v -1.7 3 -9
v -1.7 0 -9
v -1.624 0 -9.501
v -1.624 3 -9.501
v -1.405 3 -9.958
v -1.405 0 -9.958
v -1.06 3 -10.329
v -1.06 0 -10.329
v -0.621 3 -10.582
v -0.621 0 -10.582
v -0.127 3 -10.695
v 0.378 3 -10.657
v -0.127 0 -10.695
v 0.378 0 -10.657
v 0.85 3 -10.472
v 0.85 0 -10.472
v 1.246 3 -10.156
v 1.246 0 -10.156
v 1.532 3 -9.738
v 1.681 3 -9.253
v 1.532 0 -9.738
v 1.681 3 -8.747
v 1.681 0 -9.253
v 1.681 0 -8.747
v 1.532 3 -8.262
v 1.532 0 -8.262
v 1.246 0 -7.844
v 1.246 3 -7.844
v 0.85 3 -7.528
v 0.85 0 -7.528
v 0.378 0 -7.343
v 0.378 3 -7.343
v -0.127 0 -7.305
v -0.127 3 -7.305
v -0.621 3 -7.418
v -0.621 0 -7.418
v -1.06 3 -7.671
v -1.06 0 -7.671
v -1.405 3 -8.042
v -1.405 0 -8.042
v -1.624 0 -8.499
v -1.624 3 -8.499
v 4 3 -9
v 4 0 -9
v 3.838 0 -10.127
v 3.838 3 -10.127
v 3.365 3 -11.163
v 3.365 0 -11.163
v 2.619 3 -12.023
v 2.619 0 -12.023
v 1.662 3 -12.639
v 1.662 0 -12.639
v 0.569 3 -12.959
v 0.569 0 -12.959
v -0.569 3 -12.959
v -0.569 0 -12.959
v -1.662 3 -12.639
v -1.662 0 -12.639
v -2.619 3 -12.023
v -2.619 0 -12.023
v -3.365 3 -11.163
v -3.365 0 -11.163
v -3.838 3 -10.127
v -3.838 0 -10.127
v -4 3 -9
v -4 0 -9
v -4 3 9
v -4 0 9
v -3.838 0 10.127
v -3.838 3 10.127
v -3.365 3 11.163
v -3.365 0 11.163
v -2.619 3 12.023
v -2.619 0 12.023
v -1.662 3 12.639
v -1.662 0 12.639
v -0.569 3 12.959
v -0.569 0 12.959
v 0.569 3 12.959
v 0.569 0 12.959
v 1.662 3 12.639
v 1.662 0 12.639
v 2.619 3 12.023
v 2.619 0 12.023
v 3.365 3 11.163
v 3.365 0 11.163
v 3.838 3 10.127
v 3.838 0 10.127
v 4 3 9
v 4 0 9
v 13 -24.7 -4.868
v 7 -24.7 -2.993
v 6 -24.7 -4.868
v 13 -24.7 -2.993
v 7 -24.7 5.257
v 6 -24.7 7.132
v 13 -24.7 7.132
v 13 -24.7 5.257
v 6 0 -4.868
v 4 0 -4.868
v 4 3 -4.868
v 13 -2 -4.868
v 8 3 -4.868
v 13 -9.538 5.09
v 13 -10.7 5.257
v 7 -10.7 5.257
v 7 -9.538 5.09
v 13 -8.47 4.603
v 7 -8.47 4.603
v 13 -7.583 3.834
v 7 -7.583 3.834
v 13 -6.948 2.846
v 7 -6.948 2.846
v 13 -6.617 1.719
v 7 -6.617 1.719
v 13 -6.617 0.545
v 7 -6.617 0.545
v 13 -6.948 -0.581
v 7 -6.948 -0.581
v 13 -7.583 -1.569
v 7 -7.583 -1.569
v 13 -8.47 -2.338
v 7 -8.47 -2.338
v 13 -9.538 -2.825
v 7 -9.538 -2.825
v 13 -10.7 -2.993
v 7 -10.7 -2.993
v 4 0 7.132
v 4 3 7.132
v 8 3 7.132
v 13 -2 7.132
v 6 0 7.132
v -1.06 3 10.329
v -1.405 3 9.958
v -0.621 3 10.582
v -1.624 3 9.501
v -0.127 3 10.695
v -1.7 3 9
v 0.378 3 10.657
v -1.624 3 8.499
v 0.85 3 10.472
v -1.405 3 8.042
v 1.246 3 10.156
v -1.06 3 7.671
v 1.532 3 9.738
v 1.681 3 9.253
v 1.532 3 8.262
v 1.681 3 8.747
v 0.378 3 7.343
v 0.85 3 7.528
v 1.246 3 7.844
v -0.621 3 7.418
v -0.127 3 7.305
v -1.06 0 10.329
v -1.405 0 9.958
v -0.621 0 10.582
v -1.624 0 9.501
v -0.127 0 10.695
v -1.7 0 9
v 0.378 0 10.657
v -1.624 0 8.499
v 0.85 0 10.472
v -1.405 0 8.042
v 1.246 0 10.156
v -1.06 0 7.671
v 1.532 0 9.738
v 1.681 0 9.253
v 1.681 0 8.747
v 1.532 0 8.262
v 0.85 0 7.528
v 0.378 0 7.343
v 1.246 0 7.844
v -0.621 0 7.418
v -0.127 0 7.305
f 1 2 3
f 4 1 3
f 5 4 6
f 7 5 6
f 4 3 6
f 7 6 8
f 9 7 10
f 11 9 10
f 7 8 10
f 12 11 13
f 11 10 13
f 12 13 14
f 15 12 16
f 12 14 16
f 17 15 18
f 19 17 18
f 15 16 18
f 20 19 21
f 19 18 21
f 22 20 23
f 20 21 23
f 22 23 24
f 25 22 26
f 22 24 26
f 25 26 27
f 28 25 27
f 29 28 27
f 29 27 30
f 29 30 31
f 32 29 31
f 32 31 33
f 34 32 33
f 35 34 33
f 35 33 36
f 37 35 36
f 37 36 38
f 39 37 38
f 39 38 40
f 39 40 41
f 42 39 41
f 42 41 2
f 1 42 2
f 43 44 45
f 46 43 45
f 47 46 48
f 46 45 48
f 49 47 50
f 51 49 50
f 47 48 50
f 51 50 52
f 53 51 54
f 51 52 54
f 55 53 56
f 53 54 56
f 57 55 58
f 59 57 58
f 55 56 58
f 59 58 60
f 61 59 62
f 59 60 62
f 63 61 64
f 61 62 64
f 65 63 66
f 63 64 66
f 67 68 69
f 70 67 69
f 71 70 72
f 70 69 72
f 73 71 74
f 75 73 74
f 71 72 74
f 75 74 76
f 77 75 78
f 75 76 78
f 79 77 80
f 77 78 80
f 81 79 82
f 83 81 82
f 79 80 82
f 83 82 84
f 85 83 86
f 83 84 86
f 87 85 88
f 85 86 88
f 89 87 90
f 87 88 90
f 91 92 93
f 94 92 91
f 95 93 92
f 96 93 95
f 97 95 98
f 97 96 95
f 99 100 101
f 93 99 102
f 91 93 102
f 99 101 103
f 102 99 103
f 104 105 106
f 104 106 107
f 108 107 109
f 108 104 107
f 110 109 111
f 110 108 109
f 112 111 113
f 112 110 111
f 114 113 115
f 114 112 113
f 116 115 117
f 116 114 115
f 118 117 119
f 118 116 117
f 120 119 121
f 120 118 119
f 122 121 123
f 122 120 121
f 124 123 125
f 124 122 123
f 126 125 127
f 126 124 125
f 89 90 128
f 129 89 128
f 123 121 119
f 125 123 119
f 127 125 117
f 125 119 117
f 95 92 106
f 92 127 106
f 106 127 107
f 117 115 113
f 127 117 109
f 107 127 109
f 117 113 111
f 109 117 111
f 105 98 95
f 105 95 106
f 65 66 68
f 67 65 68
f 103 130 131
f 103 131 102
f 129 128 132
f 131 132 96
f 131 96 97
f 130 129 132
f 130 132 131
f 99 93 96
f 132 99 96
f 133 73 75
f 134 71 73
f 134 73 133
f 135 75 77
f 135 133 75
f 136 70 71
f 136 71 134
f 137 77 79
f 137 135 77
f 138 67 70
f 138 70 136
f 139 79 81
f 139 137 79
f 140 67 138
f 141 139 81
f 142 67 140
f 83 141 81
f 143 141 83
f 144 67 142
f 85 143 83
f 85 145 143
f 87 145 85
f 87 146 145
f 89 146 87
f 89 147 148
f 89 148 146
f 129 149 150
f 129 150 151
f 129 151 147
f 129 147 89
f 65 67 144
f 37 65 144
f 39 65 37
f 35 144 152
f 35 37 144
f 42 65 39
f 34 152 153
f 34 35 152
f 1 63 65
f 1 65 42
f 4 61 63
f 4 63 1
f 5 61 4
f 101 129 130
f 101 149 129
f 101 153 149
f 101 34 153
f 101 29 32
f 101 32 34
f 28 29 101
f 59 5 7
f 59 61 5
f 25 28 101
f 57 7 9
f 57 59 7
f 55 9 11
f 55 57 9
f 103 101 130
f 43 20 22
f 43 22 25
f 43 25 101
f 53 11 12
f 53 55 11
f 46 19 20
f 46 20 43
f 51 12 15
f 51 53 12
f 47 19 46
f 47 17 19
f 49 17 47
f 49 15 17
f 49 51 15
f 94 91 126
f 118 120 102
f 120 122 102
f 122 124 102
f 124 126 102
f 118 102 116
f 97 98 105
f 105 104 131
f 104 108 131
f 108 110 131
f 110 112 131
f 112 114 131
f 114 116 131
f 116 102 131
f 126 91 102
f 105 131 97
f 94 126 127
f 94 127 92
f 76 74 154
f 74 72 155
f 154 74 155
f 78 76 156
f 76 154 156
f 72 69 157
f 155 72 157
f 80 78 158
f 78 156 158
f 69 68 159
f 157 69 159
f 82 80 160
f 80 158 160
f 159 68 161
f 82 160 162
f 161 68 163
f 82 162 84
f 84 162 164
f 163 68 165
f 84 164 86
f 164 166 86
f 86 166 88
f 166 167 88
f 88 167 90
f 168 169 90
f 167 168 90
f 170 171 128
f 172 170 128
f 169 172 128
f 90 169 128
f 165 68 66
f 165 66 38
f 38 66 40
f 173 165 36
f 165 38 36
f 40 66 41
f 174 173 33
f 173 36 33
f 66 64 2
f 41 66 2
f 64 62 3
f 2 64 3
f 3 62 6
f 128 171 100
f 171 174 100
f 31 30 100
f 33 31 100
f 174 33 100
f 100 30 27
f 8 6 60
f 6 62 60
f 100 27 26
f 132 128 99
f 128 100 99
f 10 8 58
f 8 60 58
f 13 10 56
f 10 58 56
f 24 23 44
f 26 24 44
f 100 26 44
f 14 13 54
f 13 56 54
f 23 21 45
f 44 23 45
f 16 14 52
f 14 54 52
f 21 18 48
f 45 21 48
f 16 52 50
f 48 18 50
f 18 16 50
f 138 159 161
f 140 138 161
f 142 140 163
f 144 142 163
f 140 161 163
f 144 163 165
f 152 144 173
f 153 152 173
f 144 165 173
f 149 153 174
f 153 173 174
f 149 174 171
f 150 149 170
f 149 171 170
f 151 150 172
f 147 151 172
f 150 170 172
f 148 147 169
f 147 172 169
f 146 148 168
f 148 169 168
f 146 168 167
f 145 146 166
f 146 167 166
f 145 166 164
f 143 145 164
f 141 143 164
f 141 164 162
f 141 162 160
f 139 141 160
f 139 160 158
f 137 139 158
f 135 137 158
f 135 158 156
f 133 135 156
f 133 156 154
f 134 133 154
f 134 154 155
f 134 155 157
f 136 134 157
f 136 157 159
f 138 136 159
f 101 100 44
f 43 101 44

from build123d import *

# Parameters (mm, degrees)
BOSS_EXTRUDE1_DEPTH      = 3
M3_CLEARANCE_HOLE1_D     = 3.4
M3_CLEARANCE_HOLE1_DEPTH = 10
M3_CLEARANCE_HOLE1_TIP   = 1.021463052
SKETCH2_W                = 7
SKETCH2_H                = 12
BOSS_EXTRUDE2_DEPTH      = 24.7
CUT_EXTRUDE1_DEPTH       = 6
CHAMFER3_SIZE            = 5


with BuildPart() as part:
    # Sketch1 → Boss-Extrude1 (new body)
    with BuildSketch(Plane(origin=(0, 0, 0), x_dir=(1, 0, 0), z_dir=(0, 1, 0))):
        with BuildLine():
            ThreePointArc((-4, -9), (0, -13), (4, -9))
            Line((4, -9), (4, -7.132441433))
            Line((4, -7.132441433), (13, -7.132441433))
            Line((13, -7.132441433), (13, 4.867558567))
            Line((13, 4.867558567), (4, 4.867558567))
            Line((4, 4.867558567), (4, 9))
            ThreePointArc((4, 9), (0, 13), (-4, 9))
            Line((-4, 9), (-4, 4.867558567))
            Line((-4, 4.867558567), (-4, -9))
        make_face()
    extrude(amount=BOSS_EXTRUDE1_DEPTH)

    # M3 Clearance Hole1
    with Locations(Plane(origin=(0, 3, 0), x_dir=(1, 0, 0), z_dir=(0, 1, 0))):
        with Locations((0, -9), (0, 9)):
            Hole(M3_CLEARANCE_HOLE1_D / 2, depth=M3_CLEARANCE_HOLE1_DEPTH)
            with Locations((0, 0, -(M3_CLEARANCE_HOLE1_DEPTH + M3_CLEARANCE_HOLE1_TIP / 2))):  # 118° drill point
                Cone(0, M3_CLEARANCE_HOLE1_D / 2, M3_CLEARANCE_HOLE1_TIP, mode=Mode.SUBTRACT)

    # Sketch2 → Boss-Extrude2 (add)
    with BuildSketch(Plane.XZ):
        with Locations((9.5, 1.132441433)):
            Rectangle(SKETCH2_W, SKETCH2_H)
    extrude(amount=BOSS_EXTRUDE2_DEPTH)

    # Sketch3 → Cut-Extrude1 (cut)
    with BuildSketch(Plane(origin=(13, 0, 0), x_dir=(0, 0, -1), z_dir=(1, 0, 0))):
        with BuildLine():
            Line((2.992558567, -24.7), (-5.257441433, -24.7))
            Line((-5.257441433, -24.7), (-5.257441433, -10.7))
            ThreePointArc((-5.257441433, -10.7), (-1.132441433, -6.575), (2.992558567, -10.7))
            Line((2.992558567, -10.7), (2.992558567, -24.7))
        make_face()
    extrude(amount=-CUT_EXTRUDE1_DEPTH, mode=Mode.SUBTRACT)

    # Chamfer3
    chamfer3_edges = [part.edges().sort_by_distance(p)[0] for p in [
        (13, 3, 1.132441433),
    ]]
    chamfer(chamfer3_edges, length=CHAMFER3_SIZE)


solid = part.part
